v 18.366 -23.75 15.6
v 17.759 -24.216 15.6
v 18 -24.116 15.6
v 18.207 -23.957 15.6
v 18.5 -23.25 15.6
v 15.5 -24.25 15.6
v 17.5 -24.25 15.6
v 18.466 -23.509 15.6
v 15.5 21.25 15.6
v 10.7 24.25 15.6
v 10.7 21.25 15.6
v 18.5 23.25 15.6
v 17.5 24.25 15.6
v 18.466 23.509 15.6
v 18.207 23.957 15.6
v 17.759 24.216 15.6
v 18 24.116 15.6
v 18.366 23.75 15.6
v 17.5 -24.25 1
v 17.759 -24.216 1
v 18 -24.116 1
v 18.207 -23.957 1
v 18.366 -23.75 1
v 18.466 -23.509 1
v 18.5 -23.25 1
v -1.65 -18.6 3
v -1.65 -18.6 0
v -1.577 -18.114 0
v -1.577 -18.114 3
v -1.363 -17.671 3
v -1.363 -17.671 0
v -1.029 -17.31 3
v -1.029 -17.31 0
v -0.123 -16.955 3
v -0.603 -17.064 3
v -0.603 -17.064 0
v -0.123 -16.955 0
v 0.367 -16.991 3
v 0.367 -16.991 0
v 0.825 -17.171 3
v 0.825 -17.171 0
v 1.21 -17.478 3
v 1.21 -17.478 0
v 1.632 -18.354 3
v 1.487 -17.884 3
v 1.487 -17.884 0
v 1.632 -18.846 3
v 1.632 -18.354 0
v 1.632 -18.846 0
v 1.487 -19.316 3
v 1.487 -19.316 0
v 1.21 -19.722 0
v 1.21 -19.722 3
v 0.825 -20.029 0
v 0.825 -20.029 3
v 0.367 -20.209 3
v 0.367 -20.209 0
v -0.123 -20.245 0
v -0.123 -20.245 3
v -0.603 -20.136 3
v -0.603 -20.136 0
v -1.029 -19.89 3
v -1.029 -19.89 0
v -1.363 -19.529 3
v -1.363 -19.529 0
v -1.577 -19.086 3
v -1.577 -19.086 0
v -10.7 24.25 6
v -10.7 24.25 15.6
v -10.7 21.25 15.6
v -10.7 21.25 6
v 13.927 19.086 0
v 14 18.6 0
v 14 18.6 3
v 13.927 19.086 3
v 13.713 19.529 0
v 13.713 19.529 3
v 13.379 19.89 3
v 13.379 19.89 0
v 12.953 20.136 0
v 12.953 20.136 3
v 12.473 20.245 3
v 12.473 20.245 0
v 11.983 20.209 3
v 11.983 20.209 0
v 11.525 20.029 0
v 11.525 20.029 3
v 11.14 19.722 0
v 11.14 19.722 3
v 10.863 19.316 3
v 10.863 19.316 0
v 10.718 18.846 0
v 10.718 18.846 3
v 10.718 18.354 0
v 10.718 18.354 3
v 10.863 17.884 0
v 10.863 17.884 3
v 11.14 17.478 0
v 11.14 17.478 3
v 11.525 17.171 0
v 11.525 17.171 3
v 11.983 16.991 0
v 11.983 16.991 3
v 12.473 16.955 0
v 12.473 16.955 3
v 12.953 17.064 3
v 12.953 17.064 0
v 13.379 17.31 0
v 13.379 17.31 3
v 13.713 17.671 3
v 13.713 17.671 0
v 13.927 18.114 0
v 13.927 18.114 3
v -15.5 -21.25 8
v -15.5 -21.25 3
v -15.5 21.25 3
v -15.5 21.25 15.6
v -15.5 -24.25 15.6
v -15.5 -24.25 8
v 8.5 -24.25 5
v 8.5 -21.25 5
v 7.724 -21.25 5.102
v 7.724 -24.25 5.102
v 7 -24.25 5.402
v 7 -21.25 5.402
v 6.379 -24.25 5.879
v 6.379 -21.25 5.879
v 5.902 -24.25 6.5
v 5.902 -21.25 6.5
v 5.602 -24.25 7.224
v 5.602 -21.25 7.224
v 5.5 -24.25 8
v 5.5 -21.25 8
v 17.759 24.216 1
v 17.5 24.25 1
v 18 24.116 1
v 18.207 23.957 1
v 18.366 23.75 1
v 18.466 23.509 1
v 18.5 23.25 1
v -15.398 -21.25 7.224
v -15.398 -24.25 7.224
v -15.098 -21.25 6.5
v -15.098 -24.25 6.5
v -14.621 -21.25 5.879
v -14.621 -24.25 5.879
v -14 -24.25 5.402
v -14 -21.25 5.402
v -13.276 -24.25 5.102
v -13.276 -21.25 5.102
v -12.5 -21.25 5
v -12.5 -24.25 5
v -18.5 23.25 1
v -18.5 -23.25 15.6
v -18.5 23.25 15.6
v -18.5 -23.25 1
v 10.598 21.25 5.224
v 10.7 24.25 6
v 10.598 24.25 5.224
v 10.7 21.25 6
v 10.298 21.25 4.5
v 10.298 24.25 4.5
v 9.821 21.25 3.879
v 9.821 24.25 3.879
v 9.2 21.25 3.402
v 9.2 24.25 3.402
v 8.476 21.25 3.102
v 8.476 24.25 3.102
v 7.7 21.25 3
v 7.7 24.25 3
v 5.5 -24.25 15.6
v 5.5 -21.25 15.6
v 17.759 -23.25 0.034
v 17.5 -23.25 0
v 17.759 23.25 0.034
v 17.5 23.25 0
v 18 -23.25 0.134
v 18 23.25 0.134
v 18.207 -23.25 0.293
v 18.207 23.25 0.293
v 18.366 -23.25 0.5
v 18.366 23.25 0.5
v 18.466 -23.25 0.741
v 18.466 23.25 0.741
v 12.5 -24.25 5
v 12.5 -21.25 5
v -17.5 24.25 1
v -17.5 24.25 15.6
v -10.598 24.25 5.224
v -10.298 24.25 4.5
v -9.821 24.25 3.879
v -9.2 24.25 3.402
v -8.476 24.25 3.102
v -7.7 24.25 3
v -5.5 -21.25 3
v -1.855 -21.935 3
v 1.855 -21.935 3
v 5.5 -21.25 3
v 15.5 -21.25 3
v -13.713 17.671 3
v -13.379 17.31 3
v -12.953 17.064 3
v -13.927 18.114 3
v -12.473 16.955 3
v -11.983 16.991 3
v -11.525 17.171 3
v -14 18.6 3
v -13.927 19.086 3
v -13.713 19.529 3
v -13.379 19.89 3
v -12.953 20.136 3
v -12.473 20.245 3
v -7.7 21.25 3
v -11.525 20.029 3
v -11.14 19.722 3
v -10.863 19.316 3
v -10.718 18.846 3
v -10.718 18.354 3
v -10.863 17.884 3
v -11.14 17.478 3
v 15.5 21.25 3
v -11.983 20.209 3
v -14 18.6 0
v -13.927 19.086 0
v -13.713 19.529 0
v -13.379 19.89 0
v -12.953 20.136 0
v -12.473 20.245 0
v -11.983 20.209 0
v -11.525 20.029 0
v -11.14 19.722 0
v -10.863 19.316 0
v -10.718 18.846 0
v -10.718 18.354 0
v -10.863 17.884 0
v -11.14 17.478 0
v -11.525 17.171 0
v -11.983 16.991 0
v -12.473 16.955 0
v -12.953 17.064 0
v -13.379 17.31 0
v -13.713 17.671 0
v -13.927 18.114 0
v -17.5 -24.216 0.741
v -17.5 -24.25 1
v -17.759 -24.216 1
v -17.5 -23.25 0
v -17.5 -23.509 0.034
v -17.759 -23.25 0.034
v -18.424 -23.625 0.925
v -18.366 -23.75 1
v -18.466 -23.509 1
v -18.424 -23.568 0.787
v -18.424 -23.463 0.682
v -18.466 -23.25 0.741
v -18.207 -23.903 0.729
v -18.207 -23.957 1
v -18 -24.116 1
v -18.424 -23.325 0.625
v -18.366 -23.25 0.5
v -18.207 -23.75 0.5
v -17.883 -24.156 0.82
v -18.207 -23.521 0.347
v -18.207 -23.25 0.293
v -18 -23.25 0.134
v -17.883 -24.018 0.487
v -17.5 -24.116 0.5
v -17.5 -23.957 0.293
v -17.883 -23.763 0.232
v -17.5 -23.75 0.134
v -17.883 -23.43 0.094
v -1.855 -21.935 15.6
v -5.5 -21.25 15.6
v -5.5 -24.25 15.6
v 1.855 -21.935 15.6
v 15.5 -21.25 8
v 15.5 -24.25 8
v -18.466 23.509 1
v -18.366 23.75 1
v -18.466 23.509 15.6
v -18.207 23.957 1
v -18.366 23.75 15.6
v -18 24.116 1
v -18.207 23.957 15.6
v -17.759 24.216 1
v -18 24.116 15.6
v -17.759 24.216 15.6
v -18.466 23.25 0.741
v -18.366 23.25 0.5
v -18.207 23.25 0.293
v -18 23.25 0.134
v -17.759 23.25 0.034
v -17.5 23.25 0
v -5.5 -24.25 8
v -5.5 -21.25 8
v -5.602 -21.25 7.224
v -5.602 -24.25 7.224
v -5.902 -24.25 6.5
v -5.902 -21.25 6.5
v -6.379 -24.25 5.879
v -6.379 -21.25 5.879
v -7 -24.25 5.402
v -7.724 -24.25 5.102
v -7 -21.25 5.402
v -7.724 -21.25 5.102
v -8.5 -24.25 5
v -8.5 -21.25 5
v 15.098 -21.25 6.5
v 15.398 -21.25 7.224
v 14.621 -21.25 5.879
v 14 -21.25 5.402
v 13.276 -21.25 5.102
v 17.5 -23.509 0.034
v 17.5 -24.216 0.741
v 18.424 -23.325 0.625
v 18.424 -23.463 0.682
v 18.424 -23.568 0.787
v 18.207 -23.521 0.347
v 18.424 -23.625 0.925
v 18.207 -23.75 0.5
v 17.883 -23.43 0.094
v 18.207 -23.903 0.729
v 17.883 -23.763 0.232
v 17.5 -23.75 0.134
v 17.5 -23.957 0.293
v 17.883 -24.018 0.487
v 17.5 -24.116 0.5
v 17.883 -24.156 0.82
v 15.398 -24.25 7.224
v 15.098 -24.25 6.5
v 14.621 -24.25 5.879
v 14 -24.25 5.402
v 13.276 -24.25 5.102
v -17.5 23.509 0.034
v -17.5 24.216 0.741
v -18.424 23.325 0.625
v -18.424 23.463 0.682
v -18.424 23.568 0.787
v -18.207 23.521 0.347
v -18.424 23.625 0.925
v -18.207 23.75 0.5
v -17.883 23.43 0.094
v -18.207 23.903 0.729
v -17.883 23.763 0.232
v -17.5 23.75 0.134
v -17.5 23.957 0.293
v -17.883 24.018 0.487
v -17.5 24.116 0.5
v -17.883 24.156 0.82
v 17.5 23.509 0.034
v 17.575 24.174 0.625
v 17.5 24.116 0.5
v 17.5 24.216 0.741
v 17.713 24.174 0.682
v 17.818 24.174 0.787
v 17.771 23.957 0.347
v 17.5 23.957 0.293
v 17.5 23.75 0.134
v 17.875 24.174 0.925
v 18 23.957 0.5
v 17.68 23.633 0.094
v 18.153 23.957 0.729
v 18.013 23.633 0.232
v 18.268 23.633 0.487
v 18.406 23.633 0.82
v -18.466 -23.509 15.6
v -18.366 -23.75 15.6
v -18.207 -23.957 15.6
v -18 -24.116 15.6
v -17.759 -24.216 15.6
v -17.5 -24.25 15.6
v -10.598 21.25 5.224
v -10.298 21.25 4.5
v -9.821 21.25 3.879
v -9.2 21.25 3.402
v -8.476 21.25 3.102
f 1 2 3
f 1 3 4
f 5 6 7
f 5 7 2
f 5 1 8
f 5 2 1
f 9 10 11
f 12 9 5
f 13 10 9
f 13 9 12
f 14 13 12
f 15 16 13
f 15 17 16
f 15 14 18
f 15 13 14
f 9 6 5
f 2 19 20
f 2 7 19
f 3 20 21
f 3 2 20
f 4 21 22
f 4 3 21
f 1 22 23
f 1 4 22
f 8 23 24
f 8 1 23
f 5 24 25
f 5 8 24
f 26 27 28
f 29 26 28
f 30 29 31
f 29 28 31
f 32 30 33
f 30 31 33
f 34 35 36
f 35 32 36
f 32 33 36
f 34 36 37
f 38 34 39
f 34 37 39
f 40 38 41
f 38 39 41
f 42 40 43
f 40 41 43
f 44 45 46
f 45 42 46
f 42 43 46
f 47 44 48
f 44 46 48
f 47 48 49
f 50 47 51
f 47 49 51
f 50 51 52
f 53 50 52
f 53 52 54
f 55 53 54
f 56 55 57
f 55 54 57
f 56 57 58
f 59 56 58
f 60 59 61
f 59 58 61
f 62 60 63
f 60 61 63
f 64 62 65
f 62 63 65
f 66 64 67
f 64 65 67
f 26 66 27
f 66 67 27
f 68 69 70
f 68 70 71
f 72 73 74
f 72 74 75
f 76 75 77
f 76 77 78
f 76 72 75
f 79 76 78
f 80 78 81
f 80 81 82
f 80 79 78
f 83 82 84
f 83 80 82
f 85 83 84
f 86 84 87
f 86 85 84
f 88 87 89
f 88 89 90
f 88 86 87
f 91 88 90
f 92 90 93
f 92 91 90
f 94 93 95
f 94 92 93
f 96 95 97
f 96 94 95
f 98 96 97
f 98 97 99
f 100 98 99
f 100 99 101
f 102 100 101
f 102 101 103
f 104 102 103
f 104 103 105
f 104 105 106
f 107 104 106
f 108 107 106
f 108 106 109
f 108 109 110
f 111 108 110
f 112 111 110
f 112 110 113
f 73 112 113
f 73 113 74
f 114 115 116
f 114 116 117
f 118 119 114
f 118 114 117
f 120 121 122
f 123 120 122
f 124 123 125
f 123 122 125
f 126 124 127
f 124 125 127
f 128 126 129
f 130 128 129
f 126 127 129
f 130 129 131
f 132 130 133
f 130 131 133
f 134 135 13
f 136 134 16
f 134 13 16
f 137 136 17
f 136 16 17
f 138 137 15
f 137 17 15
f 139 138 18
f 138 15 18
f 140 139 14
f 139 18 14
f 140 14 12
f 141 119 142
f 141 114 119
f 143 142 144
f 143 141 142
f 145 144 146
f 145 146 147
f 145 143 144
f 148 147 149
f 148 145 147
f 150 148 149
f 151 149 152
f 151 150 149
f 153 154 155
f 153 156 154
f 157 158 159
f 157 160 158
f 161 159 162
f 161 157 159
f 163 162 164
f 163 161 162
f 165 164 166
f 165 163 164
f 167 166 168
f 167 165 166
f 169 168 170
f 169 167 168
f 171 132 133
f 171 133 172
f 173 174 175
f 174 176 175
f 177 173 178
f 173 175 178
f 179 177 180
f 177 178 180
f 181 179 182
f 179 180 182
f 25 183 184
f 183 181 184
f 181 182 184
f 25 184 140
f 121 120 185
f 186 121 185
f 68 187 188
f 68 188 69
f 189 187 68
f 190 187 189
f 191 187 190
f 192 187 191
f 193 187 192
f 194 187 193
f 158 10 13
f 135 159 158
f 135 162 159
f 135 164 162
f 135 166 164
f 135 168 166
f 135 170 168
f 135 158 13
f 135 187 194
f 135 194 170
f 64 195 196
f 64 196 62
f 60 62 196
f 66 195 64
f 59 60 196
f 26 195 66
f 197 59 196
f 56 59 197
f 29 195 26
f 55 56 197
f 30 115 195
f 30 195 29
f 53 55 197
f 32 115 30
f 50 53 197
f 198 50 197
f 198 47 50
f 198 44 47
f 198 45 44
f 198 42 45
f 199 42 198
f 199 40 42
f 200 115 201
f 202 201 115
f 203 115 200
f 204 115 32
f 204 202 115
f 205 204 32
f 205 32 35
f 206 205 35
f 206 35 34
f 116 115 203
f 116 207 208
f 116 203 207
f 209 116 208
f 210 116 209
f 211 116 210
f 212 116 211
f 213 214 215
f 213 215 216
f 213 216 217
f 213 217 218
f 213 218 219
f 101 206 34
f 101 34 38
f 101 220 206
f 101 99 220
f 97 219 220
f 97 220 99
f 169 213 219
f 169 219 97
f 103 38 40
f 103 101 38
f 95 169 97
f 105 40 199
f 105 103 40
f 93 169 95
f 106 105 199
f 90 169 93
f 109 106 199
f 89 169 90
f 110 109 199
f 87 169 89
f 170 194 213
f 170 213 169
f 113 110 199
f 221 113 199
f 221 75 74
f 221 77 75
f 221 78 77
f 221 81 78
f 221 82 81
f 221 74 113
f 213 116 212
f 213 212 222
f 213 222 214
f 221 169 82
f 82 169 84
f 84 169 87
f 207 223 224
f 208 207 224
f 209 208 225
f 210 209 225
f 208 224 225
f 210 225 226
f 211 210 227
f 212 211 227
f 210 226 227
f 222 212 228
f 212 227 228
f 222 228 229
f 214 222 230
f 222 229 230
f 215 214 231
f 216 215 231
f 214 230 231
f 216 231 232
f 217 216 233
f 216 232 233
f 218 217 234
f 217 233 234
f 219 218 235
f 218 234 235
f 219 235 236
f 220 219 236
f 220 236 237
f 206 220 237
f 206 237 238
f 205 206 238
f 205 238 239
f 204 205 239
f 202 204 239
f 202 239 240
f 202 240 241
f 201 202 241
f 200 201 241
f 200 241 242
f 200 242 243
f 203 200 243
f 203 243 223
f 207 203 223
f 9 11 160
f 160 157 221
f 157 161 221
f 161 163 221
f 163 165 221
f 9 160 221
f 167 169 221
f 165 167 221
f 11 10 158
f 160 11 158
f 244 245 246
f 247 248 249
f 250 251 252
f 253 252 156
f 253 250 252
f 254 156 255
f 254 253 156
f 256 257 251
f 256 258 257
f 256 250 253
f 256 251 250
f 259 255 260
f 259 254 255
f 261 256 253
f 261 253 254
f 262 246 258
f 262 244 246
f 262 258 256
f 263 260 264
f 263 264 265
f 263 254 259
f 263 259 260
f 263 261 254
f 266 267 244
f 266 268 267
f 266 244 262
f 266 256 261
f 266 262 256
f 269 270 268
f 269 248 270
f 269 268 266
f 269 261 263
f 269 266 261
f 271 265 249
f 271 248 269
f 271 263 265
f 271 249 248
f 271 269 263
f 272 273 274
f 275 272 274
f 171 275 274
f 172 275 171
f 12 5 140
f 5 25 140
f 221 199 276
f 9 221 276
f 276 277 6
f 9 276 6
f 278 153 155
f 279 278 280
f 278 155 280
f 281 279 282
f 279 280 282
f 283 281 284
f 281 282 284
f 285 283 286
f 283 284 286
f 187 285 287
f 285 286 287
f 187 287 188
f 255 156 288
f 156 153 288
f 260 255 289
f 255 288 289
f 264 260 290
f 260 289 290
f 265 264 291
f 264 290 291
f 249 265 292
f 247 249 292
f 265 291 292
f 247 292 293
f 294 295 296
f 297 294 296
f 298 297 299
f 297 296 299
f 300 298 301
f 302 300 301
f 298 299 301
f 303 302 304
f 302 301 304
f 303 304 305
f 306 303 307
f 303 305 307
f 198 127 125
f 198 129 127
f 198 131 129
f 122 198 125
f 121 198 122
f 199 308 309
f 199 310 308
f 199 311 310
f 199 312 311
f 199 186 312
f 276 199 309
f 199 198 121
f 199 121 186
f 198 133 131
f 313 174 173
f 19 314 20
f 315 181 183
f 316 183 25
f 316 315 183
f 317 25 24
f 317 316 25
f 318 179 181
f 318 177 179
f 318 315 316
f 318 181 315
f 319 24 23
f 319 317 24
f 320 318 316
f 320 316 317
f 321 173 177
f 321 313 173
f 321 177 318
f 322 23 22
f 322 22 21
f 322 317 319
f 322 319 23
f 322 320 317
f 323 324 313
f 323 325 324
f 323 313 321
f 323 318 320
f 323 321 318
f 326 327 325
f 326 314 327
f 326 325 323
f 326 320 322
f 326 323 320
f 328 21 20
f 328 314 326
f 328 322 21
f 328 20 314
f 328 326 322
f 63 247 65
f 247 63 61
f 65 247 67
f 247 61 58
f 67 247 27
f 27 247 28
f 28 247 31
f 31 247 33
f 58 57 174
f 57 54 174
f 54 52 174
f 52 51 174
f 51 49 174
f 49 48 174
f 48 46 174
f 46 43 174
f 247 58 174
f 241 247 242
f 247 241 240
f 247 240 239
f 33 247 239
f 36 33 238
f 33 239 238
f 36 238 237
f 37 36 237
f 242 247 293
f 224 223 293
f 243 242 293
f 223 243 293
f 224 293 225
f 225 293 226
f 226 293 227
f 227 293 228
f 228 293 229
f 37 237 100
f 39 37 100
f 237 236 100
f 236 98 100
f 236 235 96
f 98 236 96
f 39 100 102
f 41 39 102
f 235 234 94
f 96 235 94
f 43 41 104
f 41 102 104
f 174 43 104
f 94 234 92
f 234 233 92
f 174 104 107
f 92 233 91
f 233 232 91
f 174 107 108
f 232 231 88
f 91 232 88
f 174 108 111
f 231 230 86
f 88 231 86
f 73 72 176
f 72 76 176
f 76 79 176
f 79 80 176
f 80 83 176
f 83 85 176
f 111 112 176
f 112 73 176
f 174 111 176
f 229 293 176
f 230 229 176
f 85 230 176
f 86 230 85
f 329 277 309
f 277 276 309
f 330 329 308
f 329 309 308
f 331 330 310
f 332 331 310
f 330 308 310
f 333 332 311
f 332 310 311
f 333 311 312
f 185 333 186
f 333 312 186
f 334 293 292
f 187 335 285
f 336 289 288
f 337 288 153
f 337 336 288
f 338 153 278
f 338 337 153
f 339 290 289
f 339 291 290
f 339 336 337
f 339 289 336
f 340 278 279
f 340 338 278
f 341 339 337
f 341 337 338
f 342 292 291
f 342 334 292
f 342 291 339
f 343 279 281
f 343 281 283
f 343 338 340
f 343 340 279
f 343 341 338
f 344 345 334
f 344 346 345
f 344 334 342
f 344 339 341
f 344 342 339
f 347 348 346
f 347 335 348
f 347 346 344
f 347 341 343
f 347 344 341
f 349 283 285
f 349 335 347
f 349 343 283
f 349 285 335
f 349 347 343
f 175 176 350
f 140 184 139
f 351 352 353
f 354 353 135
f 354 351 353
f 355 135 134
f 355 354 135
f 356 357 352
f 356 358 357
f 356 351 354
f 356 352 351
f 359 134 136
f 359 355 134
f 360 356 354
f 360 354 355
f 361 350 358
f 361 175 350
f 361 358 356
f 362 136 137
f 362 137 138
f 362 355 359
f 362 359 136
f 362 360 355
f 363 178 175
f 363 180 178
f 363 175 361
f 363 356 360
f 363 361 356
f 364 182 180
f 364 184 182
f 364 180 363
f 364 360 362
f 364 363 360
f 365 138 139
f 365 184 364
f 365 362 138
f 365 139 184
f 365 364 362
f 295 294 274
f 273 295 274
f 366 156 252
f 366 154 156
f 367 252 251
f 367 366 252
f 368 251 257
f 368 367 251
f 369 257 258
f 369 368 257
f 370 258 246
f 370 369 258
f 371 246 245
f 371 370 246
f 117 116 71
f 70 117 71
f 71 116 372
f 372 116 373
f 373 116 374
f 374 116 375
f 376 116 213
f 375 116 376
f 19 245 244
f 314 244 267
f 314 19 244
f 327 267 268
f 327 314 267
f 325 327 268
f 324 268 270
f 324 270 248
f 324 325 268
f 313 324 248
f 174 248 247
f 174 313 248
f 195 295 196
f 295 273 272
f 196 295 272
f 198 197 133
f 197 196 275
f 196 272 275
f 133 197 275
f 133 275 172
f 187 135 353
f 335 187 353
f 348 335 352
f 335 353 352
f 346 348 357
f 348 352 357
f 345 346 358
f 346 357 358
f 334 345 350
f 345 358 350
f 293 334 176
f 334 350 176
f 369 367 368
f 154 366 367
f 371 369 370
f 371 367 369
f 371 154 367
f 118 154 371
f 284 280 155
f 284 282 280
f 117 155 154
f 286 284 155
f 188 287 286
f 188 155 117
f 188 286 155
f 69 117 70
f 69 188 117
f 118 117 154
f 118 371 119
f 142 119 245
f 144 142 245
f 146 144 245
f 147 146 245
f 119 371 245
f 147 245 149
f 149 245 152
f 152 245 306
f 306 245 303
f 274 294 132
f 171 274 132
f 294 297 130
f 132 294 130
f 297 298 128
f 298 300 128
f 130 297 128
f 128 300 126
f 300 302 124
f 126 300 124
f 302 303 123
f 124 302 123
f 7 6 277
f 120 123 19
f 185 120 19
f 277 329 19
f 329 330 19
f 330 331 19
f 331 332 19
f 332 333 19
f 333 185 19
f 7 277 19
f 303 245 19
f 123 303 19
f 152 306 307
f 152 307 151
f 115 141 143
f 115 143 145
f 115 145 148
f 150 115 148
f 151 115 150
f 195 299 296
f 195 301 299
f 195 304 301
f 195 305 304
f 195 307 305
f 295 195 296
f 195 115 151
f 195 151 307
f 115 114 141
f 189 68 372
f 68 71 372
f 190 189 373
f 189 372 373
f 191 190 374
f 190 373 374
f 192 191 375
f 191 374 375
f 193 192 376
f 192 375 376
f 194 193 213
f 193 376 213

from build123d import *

# Parameters (mm, degrees)
SKETCH1_W           = 31
SKETCH1_H           = 42.5
BOSS_EXTRUDE1_DEPTH = 3
SKETCH2_W           = 37
SKETCH2_H           = 48.5
SKETCH2_W_2         = 31
SKETCH2_H_2         = 42.5
BOSS_EXTRUDE2_DEPTH = 15.6
CUT_EXTRUDE1_REACH  = 36.259
SKETCH3_R           = 1.65
CUT_EXTRUDE2_REACH  = 56.202
SKETCH4_W           = 21.4
SKETCH4_H           = 12.6
CUT_EXTRUDE3_REACH  = 56.202
SKETCH5_W           = 10
SKETCH5_H           = 10.6
CUT_EXTRUDE5_REACH  = 36.259
FILLET4_R           = 1
FILLET1_R           = 3


with BuildPart() as part:
    # Sketch1 → Boss-Extrude1 (new body)
    with BuildSketch(Plane.XY):
        Rectangle(SKETCH1_W, SKETCH1_H)
    extrude(amount=BOSS_EXTRUDE1_DEPTH)

    # Sketch2 → Boss-Extrude2 (add)
    with BuildSketch(Plane.XY):
        Rectangle(SKETCH2_W, SKETCH2_H)
        Rectangle(SKETCH2_W_2, SKETCH2_H_2, mode=Mode.SUBTRACT)
    extrude(amount=BOSS_EXTRUDE2_DEPTH)

    # Sketch3 → Cut-Extrude1 (cut, up to next)
    with BuildSketch(Plane(origin=(0, 0, 0), x_dir=(-1, 0, 0), z_dir=(0, 0, -1)), mode=Mode.PRIVATE) as cut_extrude1_sk1:
        with Locations((12.35, 18.6)):
            Circle(SKETCH3_R)
    cut_extrude1_tool1 = extrude(cut_extrude1_sk1.sketch, amount=-CUT_EXTRUDE1_REACH, mode=Mode.PRIVATE) & part.part
    # Sketch3 → Cut-Extrude1 (cut, up to next)
    with BuildSketch(Plane(origin=(0, 0, 0), x_dir=(-1, 0, 0), z_dir=(0, 0, -1)), mode=Mode.PRIVATE) as cut_extrude1_sk2:
        with Locations((0, -18.6)):
            Circle(SKETCH3_R)
    cut_extrude1_tool2 = extrude(cut_extrude1_sk2.sketch, amount=-CUT_EXTRUDE1_REACH, mode=Mode.PRIVATE) & part.part
    cut_extrude1_1 = cut_extrude1_tool1.solids().sort_by_distance((-12.35, 18.6, 0))[0]
    add(cut_extrude1_1, mode=Mode.SUBTRACT)
    cut_extrude1_2 = cut_extrude1_tool2.solids().sort_by_distance((0, -18.6, 0))[0]
    add(cut_extrude1_2, mode=Mode.SUBTRACT)
    cut_extrude1 = cut_extrude1_1 + cut_extrude1_2  # Cut-Extrude1 as one shape, for the pattern or mirror that repeats it

    # Mirror1: Cut-Extrude1 across plane
    add(cut_extrude1.mirror(Plane(origin=(0, 0, 0), x_dir=(0, 0, 1), z_dir=(1, 0, 0))), mode=Mode.SUBTRACT)

    # Sketch4 → Cut-Extrude2 (cut, up to next)
    with BuildSketch(Plane(origin=(0, 24.25, 0), x_dir=(1, 0, 0), z_dir=(0, 1, 0)), mode=Mode.PRIVATE) as cut_extrude2_sk1:
        with Locations((0, -9.3)):
            Rectangle(SKETCH4_W, SKETCH4_H)
    cut_extrude2_tool1 = extrude(cut_extrude2_sk1.sketch, amount=-CUT_EXTRUDE2_REACH, mode=Mode.PRIVATE) & part.part
    add(cut_extrude2_tool1.solids().sort_by_distance((0, 24.25, 9.3))[0], mode=Mode.SUBTRACT)

    # Sketch5 → Cut-Extrude3 (cut, up to next)
    with BuildSketch(Plane.XZ.offset(24.25), mode=Mode.PRIVATE) as cut_extrude3_sk1:
        with Locations((10.5, 10.3)):
            Rectangle(SKETCH5_W, SKETCH5_H)
    cut_extrude3_tool1 = extrude(cut_extrude3_sk1.sketch, amount=-CUT_EXTRUDE3_REACH, mode=Mode.PRIVATE) & part.part
    cut_extrude3 = cut_extrude3_tool1.solids().sort_by_distance((10.5, -24.25, 10.3))[0]
    add(cut_extrude3, mode=Mode.SUBTRACT)

    # Mirror2: Cut-Extrude3 across plane
    add(cut_extrude3.mirror(Plane(origin=(0, 0, 0), x_dir=(0, 0, 1), z_dir=(1, 0, 0))), mode=Mode.SUBTRACT)

    # Cut-Extrude5: up to this face of the body (flat: up to its plane)
    cut_extrude5_end = Plane(part.part.faces().sort_by_distance((0, 0.959753002, 3))[0])
    # Sketch6 → Cut-Extrude5 (cut, up to the picked face)
    with BuildSketch(Plane.XY.offset(15.6), mode=Mode.PRIVATE) as cut_extrude5_sk1:
        with BuildLine():
            Line((5.5, -21.25), (-5.5, -21.25))
            ThreePointArc((-5.5, -21.25), (0, -22.021115477), (5.5, -21.25))
        make_face()
    cut_extrude5_tool1 = split(extrude(cut_extrude5_sk1.sketch, amount=-CUT_EXTRUDE5_REACH, mode=Mode.PRIVATE), bisect_by=cut_extrude5_end, keep=Keep.BOTH, mode=Mode.PRIVATE)
    add(cut_extrude5_tool1.solids().sort_by(Axis((0, -21.558962, 15.6), (0, 0, -1)))[0], mode=Mode.SUBTRACT)

    # Fillet4
    fillet4_edges = [part.edges().sort_by_distance(p)[0] for p in [
        (0, -24.25, 0),
        (-18.5, -24.25, 7.8),
        (18.5, 0, 0),
        (18.5, -24.25, 7.8),
        (0, 24.25, 0),
        (18.5, 24.25, 7.8),
        (-18.5, 0, 0),
        (-18.5, 24.25, 7.8),
    ]]
    fillet(fillet4_edges, radius=FILLET4_R)

    # Fillet1
    fillet1_edges = [part.edges().sort_by_distance(p)[0] for p in [
        (10.7, 22.75, 3),
        (-10.7, 22.75, 3),
        (15.5, -22.75, 5),
        (5.5, -22.75, 5),
        (-5.5, -22.75, 5),
        (-15.5, -22.75, 5),
    ]]
    fillet(fillet1_edges, radius=FILLET1_R)


solid = part.part
